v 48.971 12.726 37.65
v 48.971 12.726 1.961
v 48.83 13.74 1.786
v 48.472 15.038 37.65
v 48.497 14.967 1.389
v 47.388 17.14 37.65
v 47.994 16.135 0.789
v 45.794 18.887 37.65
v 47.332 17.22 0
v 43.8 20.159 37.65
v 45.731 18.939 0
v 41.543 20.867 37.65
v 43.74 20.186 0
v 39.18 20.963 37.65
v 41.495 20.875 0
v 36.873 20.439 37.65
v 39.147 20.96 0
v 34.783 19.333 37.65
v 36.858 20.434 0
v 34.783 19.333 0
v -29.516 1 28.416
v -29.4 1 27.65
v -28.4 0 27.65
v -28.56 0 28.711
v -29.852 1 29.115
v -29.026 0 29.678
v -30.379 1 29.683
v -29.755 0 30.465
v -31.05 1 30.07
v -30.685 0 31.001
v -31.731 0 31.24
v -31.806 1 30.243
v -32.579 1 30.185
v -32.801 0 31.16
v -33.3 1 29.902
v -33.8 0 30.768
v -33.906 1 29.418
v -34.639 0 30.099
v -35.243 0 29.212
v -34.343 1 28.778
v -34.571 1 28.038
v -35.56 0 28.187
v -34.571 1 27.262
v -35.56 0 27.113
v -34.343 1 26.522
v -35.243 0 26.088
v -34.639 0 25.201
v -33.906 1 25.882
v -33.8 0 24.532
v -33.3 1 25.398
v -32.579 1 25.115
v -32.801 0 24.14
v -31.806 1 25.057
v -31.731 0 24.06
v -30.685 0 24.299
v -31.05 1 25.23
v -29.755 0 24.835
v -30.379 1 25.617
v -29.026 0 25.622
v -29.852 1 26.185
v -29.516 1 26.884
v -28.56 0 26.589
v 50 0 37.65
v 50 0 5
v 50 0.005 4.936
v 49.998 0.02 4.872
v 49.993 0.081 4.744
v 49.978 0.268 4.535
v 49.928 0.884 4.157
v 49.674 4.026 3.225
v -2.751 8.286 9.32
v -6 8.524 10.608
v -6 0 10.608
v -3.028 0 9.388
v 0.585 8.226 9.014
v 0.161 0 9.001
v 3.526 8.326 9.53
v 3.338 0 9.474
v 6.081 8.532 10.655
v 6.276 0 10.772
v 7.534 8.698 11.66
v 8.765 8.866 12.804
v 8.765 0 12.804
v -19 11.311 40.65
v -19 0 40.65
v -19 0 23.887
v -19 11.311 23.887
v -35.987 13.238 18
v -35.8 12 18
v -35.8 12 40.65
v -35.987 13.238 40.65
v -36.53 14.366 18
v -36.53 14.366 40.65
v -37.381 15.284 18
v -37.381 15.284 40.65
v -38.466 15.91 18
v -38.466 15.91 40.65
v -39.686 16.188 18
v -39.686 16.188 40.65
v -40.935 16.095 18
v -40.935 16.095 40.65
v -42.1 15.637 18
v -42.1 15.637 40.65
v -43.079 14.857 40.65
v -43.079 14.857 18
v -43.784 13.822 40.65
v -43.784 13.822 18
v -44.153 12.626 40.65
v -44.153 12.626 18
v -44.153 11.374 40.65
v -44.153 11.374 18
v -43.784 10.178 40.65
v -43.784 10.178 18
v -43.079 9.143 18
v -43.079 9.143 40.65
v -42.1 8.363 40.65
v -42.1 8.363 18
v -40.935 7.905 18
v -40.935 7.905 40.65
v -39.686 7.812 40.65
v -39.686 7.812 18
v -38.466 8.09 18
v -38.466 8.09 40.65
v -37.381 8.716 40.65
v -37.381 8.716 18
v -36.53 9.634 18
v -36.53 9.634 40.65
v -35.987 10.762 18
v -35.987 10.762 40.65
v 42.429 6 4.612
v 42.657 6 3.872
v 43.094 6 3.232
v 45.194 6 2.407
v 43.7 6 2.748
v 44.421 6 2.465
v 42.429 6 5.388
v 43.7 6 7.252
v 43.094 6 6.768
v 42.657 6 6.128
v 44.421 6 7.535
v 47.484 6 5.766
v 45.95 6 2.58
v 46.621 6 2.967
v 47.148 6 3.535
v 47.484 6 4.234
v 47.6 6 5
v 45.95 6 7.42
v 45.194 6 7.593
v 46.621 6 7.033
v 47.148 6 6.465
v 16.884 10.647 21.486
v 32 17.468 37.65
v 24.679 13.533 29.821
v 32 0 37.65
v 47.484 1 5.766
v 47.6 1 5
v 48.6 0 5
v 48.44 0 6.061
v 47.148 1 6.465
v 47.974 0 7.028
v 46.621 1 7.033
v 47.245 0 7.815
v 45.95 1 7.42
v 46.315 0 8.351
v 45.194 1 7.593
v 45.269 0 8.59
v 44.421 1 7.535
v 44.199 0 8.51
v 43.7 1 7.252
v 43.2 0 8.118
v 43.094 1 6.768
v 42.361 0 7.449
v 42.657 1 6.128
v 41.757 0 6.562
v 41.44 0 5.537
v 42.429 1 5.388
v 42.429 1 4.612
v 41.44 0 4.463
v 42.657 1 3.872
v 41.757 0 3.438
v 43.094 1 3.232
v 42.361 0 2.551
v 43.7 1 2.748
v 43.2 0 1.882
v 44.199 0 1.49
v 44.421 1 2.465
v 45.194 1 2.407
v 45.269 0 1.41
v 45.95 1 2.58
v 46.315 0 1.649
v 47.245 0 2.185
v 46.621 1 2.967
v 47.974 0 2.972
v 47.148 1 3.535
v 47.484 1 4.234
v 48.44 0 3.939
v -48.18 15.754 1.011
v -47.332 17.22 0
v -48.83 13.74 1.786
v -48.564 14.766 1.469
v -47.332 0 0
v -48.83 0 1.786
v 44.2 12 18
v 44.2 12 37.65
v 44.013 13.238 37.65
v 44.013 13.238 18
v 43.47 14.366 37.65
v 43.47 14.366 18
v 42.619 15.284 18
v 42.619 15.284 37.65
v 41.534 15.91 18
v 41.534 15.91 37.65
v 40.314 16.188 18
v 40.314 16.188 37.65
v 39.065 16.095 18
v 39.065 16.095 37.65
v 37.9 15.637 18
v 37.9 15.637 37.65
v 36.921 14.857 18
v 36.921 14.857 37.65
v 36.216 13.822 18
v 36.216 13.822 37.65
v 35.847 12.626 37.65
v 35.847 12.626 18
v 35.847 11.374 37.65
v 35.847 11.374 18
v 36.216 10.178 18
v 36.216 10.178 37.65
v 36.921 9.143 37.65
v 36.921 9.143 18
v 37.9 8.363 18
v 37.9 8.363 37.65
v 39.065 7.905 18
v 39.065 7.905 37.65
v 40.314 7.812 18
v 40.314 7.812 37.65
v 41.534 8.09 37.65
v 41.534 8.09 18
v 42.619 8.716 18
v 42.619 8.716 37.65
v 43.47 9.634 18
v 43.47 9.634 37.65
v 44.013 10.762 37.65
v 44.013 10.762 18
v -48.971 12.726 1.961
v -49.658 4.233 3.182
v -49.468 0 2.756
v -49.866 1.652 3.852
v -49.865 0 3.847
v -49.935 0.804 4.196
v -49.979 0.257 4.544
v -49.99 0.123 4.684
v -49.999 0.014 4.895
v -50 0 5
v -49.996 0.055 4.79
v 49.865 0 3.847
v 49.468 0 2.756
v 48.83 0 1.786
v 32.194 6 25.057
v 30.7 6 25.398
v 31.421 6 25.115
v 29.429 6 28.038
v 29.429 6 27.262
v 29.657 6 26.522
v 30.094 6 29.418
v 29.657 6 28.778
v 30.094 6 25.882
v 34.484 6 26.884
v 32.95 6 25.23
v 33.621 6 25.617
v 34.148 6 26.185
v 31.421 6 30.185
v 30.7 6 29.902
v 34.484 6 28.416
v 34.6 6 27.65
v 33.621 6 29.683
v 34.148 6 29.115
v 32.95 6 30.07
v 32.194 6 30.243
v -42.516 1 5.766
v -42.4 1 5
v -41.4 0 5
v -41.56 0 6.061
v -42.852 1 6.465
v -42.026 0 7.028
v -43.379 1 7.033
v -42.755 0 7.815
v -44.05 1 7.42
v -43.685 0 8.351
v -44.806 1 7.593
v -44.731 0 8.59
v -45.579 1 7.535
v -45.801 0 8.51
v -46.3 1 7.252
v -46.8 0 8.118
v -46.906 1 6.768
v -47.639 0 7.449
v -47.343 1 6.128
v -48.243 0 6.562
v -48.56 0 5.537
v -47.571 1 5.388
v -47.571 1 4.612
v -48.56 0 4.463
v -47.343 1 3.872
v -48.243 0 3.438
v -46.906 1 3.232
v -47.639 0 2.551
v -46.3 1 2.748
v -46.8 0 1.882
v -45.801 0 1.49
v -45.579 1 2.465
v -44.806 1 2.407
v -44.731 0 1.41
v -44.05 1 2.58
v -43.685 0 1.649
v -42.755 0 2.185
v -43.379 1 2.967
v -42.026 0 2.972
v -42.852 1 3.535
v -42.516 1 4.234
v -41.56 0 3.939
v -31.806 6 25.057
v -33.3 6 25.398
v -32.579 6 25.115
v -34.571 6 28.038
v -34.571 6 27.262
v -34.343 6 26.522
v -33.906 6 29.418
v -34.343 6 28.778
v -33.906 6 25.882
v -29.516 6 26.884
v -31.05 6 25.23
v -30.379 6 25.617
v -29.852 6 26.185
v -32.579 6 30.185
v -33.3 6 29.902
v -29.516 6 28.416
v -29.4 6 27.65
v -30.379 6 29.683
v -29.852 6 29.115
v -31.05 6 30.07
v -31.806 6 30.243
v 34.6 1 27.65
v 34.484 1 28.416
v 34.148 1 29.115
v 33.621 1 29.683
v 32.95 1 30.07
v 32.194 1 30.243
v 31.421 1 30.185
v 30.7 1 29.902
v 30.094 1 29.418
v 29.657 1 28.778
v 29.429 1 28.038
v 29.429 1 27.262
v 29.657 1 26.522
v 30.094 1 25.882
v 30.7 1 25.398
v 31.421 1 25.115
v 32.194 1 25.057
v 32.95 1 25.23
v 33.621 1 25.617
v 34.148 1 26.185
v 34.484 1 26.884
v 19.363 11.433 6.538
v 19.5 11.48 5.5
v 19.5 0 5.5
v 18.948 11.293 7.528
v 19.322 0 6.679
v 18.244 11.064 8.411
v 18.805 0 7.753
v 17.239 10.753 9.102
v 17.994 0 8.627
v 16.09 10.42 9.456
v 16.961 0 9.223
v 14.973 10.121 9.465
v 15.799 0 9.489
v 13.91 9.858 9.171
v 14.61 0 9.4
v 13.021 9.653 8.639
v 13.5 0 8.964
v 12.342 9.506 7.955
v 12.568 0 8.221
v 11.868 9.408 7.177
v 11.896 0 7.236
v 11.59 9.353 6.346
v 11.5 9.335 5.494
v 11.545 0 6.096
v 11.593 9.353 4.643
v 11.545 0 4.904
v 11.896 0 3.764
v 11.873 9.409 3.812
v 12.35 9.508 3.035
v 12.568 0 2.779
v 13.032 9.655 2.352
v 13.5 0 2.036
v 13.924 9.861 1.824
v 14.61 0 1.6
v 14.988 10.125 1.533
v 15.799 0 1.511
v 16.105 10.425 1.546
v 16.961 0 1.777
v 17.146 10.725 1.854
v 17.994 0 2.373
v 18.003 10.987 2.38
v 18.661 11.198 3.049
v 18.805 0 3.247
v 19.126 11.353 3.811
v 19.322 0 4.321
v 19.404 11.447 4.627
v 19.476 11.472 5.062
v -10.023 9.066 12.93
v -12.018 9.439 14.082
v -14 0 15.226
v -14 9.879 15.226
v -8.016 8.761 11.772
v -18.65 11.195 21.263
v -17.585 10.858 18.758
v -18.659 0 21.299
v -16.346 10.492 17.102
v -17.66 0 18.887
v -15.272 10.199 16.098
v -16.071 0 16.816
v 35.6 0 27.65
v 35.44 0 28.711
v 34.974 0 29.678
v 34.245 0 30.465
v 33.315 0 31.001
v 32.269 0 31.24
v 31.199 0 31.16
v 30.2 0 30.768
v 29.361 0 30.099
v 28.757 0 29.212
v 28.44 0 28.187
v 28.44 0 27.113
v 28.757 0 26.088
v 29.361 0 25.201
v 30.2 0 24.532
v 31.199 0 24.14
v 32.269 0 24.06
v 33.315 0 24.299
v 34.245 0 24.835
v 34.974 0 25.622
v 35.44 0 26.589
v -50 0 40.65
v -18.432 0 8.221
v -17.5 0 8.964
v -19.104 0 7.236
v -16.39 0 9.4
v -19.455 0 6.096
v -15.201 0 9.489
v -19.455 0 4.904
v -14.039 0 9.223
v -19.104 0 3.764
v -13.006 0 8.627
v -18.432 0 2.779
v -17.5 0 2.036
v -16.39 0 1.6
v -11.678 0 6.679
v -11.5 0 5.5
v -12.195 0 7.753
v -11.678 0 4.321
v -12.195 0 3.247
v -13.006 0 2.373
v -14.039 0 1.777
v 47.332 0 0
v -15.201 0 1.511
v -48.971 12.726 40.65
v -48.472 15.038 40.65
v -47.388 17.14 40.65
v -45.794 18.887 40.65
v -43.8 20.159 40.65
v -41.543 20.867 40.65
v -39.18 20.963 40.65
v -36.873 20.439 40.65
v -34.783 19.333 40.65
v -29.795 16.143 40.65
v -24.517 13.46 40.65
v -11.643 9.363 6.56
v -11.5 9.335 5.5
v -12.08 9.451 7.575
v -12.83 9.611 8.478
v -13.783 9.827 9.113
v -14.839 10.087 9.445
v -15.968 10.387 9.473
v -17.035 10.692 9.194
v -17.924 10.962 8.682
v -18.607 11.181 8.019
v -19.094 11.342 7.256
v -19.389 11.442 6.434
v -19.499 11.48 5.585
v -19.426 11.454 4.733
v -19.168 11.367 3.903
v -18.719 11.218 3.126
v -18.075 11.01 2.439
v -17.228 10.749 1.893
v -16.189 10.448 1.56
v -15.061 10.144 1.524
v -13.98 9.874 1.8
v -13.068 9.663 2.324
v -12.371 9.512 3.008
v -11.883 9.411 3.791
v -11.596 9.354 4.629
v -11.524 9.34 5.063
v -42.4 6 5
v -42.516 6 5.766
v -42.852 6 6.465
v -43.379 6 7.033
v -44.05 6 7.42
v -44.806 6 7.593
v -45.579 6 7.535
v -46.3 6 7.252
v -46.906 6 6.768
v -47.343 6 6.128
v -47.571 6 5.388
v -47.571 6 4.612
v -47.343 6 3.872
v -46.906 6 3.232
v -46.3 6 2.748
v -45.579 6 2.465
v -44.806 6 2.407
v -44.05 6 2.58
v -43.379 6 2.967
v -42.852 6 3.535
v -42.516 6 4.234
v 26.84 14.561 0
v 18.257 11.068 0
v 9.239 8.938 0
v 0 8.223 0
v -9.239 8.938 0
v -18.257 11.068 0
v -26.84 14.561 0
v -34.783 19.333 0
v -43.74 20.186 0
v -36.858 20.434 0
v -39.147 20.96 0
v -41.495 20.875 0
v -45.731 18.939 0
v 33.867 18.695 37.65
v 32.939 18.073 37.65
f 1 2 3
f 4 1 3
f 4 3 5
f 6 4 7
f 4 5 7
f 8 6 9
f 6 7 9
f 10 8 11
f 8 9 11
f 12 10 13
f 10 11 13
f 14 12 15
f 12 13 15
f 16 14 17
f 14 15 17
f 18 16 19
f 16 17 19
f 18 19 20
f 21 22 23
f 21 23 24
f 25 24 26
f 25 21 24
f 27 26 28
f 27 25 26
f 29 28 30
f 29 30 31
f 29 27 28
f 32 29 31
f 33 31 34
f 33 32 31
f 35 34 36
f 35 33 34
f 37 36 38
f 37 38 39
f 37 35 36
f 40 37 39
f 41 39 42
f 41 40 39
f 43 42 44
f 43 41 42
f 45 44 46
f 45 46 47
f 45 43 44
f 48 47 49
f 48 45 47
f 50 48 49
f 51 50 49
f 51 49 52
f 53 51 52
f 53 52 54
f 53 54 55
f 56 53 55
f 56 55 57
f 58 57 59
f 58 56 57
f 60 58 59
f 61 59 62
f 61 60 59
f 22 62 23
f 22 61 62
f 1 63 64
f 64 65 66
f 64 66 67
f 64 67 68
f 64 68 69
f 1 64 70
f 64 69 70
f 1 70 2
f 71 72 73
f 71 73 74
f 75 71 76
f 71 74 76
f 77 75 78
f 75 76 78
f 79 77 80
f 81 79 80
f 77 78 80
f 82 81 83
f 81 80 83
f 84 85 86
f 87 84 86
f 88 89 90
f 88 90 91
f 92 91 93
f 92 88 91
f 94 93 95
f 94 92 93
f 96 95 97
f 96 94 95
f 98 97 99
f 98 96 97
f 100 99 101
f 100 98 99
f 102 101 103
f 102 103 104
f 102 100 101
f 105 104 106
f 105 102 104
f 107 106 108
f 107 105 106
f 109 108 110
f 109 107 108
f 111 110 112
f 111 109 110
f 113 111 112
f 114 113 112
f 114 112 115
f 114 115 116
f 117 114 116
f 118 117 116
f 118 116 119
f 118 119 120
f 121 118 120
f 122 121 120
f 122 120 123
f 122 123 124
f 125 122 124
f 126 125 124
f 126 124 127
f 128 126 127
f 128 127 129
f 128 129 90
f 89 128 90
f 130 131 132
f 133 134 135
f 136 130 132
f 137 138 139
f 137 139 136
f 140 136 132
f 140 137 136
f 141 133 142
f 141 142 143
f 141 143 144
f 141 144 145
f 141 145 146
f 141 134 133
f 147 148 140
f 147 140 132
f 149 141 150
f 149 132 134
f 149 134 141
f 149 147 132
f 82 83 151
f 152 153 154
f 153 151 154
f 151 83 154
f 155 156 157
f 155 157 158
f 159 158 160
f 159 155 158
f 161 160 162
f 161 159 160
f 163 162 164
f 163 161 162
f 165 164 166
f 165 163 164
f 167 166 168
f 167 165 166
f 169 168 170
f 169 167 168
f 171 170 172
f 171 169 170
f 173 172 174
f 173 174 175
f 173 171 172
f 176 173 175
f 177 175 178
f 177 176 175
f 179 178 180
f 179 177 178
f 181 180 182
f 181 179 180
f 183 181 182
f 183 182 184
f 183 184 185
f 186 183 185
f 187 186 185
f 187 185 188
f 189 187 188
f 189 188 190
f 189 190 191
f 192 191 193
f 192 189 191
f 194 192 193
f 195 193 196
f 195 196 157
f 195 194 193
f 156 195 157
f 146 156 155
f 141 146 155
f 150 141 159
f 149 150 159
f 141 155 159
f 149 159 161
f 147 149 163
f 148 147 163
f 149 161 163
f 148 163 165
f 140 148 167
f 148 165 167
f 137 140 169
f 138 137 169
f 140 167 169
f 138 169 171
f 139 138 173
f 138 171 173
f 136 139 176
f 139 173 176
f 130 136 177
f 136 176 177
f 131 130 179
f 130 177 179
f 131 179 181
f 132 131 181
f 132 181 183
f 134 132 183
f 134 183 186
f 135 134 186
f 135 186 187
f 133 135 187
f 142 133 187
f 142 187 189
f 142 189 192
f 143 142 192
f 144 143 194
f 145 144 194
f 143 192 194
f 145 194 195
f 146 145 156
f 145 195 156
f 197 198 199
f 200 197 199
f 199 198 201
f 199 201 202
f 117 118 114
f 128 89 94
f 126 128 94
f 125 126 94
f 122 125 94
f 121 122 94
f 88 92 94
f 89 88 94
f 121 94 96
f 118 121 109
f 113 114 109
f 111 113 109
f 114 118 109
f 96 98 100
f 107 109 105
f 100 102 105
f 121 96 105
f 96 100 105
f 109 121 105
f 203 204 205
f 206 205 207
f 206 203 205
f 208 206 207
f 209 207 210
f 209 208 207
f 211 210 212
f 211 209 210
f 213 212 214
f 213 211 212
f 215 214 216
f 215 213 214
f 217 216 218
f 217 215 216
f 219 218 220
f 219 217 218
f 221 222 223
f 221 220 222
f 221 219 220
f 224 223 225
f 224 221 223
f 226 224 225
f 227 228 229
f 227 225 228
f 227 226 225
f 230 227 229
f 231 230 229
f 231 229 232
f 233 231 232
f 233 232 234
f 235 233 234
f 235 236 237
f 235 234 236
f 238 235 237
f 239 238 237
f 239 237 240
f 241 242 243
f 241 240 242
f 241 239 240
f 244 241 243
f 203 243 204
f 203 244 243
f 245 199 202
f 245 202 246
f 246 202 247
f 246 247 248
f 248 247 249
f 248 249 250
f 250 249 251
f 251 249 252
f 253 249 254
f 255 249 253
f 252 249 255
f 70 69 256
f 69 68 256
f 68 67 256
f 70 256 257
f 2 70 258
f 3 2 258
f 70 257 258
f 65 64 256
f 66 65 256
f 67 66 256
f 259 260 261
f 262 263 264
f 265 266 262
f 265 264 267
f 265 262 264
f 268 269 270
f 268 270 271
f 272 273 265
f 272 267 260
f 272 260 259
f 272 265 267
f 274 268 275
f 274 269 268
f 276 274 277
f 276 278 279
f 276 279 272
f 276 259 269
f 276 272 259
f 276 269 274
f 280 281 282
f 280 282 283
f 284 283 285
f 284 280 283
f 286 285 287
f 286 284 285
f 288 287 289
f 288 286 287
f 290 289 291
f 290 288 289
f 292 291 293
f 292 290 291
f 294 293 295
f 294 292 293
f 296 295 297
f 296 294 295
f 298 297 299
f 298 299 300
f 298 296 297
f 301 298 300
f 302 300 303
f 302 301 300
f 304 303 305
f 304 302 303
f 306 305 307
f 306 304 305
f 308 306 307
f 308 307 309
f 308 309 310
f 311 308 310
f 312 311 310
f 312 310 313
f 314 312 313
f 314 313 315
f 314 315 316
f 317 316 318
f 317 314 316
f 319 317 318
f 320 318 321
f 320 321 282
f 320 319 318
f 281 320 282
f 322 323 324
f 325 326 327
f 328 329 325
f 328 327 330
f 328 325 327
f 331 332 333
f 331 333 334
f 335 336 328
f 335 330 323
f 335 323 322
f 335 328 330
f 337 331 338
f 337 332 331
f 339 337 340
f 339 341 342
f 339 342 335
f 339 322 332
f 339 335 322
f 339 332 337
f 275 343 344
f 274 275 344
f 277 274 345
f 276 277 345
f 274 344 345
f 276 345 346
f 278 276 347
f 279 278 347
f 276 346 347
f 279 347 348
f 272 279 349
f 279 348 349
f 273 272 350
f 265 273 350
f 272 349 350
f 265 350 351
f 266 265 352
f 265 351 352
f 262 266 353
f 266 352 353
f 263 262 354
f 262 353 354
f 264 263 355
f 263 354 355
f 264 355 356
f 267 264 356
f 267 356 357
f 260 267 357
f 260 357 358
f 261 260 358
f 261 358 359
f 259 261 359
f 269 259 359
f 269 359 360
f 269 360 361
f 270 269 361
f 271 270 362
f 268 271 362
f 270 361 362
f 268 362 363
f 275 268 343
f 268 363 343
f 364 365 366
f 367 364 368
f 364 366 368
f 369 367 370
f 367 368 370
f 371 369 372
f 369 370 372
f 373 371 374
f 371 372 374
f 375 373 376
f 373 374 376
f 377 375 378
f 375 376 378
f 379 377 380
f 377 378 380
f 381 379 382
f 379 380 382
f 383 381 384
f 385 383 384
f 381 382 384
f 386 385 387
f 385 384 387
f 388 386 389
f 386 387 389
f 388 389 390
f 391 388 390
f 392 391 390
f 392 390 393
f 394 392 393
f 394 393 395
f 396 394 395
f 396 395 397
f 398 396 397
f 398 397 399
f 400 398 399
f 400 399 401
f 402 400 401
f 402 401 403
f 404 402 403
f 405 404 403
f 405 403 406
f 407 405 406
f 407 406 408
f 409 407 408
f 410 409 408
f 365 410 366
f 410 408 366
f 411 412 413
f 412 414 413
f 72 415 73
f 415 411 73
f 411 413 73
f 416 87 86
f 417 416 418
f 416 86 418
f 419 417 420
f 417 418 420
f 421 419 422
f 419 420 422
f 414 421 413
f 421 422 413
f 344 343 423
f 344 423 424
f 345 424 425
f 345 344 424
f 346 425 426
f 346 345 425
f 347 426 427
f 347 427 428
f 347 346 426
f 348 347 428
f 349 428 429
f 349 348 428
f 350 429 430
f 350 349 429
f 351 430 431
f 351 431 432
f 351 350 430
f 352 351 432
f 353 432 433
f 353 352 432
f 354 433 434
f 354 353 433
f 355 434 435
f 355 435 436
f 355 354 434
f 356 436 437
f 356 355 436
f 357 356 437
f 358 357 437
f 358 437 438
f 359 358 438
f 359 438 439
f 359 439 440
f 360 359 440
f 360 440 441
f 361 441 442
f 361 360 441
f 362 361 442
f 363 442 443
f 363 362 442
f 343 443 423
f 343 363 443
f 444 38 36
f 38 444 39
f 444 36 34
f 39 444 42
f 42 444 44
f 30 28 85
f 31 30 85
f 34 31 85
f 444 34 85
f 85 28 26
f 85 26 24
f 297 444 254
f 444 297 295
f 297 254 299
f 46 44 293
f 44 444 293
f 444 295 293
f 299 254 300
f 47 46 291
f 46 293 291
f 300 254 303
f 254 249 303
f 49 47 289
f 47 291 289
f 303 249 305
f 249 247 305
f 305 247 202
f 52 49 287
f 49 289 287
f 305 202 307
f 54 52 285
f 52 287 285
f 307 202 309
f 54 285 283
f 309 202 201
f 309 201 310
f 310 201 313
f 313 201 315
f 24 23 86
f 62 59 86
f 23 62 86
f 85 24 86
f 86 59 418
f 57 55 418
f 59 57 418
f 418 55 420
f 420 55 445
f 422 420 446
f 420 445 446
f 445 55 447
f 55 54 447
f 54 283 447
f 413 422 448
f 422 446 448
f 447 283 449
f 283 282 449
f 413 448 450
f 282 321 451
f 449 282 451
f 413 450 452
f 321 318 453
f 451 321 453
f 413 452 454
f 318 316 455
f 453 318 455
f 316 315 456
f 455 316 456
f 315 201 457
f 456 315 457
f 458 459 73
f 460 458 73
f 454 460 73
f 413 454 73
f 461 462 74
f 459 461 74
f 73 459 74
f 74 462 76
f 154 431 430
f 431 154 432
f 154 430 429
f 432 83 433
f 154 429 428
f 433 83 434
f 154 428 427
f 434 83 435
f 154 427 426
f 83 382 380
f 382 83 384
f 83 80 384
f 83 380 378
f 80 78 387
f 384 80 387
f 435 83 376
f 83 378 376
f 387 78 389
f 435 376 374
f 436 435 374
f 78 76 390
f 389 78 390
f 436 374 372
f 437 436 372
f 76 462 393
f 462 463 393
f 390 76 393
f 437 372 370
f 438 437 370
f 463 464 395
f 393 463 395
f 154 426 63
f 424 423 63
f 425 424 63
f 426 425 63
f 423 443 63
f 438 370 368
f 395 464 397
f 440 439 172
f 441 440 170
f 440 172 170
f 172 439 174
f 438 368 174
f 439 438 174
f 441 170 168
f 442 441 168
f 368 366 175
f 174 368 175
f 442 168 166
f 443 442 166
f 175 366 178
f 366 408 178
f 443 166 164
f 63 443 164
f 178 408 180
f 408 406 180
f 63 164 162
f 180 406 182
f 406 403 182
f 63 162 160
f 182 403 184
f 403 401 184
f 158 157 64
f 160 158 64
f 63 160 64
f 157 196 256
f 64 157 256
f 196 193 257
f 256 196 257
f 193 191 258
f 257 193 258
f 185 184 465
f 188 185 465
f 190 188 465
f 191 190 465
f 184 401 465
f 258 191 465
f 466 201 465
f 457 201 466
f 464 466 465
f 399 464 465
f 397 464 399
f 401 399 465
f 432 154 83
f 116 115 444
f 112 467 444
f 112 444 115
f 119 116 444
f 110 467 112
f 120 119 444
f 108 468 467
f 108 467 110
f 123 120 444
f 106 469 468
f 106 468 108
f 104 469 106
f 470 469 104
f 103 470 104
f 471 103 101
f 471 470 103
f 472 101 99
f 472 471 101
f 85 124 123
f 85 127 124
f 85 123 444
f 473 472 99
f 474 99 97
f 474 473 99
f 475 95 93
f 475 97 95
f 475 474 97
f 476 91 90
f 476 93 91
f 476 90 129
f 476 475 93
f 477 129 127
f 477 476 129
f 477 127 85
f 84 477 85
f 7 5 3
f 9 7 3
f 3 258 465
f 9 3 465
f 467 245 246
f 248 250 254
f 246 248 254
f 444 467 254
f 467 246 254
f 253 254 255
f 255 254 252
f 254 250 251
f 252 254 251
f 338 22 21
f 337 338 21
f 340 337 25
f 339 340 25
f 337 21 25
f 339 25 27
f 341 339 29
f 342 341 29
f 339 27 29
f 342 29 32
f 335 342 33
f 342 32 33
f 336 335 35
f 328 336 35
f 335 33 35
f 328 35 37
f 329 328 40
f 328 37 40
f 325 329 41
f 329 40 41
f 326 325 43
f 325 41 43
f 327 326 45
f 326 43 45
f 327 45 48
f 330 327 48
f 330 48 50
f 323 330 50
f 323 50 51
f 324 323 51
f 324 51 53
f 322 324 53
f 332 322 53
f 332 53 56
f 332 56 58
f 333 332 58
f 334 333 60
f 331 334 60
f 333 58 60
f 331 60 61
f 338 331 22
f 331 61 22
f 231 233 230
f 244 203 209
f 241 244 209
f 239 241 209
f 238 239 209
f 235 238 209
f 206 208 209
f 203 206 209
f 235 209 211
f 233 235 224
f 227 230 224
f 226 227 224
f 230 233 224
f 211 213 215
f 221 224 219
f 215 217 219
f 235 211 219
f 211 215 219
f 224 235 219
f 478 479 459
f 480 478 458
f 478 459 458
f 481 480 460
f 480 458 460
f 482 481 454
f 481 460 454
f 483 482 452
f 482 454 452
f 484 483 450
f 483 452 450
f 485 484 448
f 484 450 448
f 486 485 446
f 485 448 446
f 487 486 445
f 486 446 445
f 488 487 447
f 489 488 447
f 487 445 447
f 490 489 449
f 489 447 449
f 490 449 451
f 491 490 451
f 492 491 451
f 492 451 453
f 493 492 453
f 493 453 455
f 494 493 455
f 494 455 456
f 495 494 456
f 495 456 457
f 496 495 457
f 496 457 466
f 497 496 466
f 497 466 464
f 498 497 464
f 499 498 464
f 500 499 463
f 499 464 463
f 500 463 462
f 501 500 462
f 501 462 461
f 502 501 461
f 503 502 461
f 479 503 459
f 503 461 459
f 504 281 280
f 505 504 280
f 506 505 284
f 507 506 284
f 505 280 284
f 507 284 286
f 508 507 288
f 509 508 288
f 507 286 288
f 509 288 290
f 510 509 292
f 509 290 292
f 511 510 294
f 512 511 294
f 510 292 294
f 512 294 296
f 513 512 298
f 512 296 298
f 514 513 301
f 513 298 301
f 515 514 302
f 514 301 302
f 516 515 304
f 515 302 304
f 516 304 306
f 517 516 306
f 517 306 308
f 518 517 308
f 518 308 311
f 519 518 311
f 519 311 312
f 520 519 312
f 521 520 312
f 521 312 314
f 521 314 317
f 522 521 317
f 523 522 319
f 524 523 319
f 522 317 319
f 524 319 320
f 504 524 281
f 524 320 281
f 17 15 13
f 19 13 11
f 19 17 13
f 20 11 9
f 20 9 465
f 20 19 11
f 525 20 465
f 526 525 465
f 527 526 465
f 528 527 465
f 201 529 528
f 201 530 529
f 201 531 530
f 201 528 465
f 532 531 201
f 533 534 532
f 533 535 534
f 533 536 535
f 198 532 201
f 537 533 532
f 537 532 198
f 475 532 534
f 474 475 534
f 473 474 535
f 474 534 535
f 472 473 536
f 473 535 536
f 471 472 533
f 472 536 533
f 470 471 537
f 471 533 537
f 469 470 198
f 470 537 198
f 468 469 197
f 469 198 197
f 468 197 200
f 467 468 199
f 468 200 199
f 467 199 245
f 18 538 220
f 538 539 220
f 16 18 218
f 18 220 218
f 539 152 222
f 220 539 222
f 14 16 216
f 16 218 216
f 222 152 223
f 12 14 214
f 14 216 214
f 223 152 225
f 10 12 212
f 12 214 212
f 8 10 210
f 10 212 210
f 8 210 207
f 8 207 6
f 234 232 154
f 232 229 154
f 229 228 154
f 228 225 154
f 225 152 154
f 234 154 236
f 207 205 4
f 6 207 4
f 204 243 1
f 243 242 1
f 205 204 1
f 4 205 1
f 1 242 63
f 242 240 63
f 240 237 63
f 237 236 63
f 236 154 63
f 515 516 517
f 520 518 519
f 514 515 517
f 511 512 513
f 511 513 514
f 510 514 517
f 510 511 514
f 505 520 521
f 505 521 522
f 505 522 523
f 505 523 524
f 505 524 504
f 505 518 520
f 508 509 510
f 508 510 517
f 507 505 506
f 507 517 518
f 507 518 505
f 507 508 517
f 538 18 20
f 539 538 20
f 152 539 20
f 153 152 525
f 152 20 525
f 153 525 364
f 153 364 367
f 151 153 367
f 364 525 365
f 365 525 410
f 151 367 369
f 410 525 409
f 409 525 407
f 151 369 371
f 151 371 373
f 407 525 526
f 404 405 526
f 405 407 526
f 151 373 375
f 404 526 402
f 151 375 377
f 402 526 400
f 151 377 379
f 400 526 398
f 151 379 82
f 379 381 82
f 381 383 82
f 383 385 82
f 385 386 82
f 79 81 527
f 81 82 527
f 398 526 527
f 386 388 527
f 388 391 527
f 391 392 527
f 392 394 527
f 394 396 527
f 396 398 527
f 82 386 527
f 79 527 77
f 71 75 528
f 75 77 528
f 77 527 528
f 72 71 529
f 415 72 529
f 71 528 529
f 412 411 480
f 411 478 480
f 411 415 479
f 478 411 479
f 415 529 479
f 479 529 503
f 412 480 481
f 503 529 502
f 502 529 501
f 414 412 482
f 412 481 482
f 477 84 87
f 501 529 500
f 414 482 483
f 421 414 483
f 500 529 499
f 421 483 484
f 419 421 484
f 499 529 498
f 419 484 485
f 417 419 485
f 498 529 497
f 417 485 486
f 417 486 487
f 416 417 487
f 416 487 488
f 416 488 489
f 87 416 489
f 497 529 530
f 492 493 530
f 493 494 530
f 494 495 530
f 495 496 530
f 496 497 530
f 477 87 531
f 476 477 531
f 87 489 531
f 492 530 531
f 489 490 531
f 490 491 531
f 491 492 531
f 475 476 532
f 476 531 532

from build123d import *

# Parameters (mm, degrees)
SKETCH1_R           = 4.2
BOSS_EXTRUDE1_DEPTH = 40.65
SKETCH2_R           = 4.2
BOSS_EXTRUDE2_DEPTH = 18
SKETCH3_R           = 4
CUT_EXTRUDE1_DEPTH  = 22
SKETCH4_R           = 2.6
CUT_EXTRUDE2_DEPTH  = 6
CHAMFER1_SIZE       = 1
CUT_EXTRUDE3_DEPTH  = 22


with BuildPart() as part:
    # Sketch1 → Boss-Extrude1 (new body)
    with BuildSketch(Plane.XY):
        with BuildLine():
            Line((-48.970703673, 12.725586394), (-50, 0))
            Line((-50, 0), (50, 0))
            Line((50, 0), (48.970703673, 12.725586394))
            ThreePointArc((48.970703673, 12.725586394), (43.799691423, 20.158574942), (34.782608696, 19.333404937))
            ThreePointArc((34.782608696, 19.333404937), (0, 8.222771187), (-34.782608696, 19.333404937))
            ThreePointArc((-34.782608696, 19.333404937), (-43.799691423, 20.158574942), (-48.970703673, 12.725586394))
        make_face()
        with Locations((-40, 12)):
            Circle(SKETCH1_R, mode=Mode.SUBTRACT)
        with Locations((40, 12)):
            Circle(SKETCH1_R, mode=Mode.SUBTRACT)
    extrude(amount=BOSS_EXTRUDE1_DEPTH)

    # Sketch2 → Boss-Extrude2 (add)
    with BuildSketch(Plane(origin=(0, 0, 0), x_dir=(-1, 0, 0), z_dir=(0, 0, -1))):
        with Locations((-40, 12)):
            Circle(SKETCH2_R)
        with Locations((40, 12)):
            Circle(SKETCH2_R)
    extrude(amount=-BOSS_EXTRUDE2_DEPTH)

    # Sketch3 → Cut-Extrude1 (cut, through all)
    with BuildSketch(Plane.XZ):
        with Locations((-15.5, 5.5)):
            Circle(SKETCH3_R)
        with Locations((15.5, 5.5)):
            Circle(SKETCH3_R)
        with BuildLine():
            Line((8.764674023, 12.803629506), (32, 37.65))
            Line((32, 37.65), (50, 37.65))
            Line((50, 37.65), (50, 40.65))
            Line((50, 40.65), (-19, 40.65))
            Line((-19, 40.65), (-19, 23.886751346))
            ThreePointArc((-19, 23.886751346), (-17.660254038, 18.886751346), (-14, 15.226497308))
            Line((-14, 15.226497308), (-6, 10.607695155))
            ThreePointArc((-6, 10.607695155), (1.765329298, 9.130559724), (8.764674023, 12.803629506))
        make_face()
    extrude(amount=-CUT_EXTRUDE1_DEPTH, mode=Mode.SUBTRACT)

    # Sketch4 → Cut-Extrude2 (cut)
    with BuildSketch(Plane.XZ):
        with Locations((-32, 27.65)):
            Circle(SKETCH4_R)
        with Locations((-45, 5)):
            Circle(SKETCH4_R)
        with Locations((32, 27.65)):
            Circle(SKETCH4_R)
        with Locations((45, 5)):
            Circle(SKETCH4_R)
    extrude(amount=-CUT_EXTRUDE2_DEPTH, mode=Mode.SUBTRACT)

    # Chamfer1
    chamfer1_edges = [part.edges().sort_by_distance(p)[0] for p in [
        (-34.6, 0, 27.65),
        (-47.6, 0, 5),
        (29.4, 0, 27.65),
        (42.4, 0, 5),
    ]]
    chamfer(chamfer1_edges, length=CHAMFER1_SIZE)

    # Sketch5 → Cut-Extrude3 (cut, through all)
    with BuildSketch(Plane.XZ):
        with BuildLine():
            Line((-50, 5), (-50, 0))
            Line((-50, 0), (-47.331538291, 0))
            Line((-47.331538291, 0), (-48.830222216, 1.786061952))
            ThreePointArc((-48.830222216, 1.786061952), (-49.698463104, 3.289899283), (-50, 5))
        make_face()
        with BuildLine():
            Line((48.830222216, 1.786061952), (47.331538291, 0))
            Line((47.331538291, 0), (50, 0))
            Line((50, 0), (50, 5))
            ThreePointArc((50, 5), (49.698463104, 3.289899283), (48.830222216, 1.786061952))
        make_face()
    extrude(amount=-CUT_EXTRUDE3_DEPTH, mode=Mode.SUBTRACT)


solid = part.part
